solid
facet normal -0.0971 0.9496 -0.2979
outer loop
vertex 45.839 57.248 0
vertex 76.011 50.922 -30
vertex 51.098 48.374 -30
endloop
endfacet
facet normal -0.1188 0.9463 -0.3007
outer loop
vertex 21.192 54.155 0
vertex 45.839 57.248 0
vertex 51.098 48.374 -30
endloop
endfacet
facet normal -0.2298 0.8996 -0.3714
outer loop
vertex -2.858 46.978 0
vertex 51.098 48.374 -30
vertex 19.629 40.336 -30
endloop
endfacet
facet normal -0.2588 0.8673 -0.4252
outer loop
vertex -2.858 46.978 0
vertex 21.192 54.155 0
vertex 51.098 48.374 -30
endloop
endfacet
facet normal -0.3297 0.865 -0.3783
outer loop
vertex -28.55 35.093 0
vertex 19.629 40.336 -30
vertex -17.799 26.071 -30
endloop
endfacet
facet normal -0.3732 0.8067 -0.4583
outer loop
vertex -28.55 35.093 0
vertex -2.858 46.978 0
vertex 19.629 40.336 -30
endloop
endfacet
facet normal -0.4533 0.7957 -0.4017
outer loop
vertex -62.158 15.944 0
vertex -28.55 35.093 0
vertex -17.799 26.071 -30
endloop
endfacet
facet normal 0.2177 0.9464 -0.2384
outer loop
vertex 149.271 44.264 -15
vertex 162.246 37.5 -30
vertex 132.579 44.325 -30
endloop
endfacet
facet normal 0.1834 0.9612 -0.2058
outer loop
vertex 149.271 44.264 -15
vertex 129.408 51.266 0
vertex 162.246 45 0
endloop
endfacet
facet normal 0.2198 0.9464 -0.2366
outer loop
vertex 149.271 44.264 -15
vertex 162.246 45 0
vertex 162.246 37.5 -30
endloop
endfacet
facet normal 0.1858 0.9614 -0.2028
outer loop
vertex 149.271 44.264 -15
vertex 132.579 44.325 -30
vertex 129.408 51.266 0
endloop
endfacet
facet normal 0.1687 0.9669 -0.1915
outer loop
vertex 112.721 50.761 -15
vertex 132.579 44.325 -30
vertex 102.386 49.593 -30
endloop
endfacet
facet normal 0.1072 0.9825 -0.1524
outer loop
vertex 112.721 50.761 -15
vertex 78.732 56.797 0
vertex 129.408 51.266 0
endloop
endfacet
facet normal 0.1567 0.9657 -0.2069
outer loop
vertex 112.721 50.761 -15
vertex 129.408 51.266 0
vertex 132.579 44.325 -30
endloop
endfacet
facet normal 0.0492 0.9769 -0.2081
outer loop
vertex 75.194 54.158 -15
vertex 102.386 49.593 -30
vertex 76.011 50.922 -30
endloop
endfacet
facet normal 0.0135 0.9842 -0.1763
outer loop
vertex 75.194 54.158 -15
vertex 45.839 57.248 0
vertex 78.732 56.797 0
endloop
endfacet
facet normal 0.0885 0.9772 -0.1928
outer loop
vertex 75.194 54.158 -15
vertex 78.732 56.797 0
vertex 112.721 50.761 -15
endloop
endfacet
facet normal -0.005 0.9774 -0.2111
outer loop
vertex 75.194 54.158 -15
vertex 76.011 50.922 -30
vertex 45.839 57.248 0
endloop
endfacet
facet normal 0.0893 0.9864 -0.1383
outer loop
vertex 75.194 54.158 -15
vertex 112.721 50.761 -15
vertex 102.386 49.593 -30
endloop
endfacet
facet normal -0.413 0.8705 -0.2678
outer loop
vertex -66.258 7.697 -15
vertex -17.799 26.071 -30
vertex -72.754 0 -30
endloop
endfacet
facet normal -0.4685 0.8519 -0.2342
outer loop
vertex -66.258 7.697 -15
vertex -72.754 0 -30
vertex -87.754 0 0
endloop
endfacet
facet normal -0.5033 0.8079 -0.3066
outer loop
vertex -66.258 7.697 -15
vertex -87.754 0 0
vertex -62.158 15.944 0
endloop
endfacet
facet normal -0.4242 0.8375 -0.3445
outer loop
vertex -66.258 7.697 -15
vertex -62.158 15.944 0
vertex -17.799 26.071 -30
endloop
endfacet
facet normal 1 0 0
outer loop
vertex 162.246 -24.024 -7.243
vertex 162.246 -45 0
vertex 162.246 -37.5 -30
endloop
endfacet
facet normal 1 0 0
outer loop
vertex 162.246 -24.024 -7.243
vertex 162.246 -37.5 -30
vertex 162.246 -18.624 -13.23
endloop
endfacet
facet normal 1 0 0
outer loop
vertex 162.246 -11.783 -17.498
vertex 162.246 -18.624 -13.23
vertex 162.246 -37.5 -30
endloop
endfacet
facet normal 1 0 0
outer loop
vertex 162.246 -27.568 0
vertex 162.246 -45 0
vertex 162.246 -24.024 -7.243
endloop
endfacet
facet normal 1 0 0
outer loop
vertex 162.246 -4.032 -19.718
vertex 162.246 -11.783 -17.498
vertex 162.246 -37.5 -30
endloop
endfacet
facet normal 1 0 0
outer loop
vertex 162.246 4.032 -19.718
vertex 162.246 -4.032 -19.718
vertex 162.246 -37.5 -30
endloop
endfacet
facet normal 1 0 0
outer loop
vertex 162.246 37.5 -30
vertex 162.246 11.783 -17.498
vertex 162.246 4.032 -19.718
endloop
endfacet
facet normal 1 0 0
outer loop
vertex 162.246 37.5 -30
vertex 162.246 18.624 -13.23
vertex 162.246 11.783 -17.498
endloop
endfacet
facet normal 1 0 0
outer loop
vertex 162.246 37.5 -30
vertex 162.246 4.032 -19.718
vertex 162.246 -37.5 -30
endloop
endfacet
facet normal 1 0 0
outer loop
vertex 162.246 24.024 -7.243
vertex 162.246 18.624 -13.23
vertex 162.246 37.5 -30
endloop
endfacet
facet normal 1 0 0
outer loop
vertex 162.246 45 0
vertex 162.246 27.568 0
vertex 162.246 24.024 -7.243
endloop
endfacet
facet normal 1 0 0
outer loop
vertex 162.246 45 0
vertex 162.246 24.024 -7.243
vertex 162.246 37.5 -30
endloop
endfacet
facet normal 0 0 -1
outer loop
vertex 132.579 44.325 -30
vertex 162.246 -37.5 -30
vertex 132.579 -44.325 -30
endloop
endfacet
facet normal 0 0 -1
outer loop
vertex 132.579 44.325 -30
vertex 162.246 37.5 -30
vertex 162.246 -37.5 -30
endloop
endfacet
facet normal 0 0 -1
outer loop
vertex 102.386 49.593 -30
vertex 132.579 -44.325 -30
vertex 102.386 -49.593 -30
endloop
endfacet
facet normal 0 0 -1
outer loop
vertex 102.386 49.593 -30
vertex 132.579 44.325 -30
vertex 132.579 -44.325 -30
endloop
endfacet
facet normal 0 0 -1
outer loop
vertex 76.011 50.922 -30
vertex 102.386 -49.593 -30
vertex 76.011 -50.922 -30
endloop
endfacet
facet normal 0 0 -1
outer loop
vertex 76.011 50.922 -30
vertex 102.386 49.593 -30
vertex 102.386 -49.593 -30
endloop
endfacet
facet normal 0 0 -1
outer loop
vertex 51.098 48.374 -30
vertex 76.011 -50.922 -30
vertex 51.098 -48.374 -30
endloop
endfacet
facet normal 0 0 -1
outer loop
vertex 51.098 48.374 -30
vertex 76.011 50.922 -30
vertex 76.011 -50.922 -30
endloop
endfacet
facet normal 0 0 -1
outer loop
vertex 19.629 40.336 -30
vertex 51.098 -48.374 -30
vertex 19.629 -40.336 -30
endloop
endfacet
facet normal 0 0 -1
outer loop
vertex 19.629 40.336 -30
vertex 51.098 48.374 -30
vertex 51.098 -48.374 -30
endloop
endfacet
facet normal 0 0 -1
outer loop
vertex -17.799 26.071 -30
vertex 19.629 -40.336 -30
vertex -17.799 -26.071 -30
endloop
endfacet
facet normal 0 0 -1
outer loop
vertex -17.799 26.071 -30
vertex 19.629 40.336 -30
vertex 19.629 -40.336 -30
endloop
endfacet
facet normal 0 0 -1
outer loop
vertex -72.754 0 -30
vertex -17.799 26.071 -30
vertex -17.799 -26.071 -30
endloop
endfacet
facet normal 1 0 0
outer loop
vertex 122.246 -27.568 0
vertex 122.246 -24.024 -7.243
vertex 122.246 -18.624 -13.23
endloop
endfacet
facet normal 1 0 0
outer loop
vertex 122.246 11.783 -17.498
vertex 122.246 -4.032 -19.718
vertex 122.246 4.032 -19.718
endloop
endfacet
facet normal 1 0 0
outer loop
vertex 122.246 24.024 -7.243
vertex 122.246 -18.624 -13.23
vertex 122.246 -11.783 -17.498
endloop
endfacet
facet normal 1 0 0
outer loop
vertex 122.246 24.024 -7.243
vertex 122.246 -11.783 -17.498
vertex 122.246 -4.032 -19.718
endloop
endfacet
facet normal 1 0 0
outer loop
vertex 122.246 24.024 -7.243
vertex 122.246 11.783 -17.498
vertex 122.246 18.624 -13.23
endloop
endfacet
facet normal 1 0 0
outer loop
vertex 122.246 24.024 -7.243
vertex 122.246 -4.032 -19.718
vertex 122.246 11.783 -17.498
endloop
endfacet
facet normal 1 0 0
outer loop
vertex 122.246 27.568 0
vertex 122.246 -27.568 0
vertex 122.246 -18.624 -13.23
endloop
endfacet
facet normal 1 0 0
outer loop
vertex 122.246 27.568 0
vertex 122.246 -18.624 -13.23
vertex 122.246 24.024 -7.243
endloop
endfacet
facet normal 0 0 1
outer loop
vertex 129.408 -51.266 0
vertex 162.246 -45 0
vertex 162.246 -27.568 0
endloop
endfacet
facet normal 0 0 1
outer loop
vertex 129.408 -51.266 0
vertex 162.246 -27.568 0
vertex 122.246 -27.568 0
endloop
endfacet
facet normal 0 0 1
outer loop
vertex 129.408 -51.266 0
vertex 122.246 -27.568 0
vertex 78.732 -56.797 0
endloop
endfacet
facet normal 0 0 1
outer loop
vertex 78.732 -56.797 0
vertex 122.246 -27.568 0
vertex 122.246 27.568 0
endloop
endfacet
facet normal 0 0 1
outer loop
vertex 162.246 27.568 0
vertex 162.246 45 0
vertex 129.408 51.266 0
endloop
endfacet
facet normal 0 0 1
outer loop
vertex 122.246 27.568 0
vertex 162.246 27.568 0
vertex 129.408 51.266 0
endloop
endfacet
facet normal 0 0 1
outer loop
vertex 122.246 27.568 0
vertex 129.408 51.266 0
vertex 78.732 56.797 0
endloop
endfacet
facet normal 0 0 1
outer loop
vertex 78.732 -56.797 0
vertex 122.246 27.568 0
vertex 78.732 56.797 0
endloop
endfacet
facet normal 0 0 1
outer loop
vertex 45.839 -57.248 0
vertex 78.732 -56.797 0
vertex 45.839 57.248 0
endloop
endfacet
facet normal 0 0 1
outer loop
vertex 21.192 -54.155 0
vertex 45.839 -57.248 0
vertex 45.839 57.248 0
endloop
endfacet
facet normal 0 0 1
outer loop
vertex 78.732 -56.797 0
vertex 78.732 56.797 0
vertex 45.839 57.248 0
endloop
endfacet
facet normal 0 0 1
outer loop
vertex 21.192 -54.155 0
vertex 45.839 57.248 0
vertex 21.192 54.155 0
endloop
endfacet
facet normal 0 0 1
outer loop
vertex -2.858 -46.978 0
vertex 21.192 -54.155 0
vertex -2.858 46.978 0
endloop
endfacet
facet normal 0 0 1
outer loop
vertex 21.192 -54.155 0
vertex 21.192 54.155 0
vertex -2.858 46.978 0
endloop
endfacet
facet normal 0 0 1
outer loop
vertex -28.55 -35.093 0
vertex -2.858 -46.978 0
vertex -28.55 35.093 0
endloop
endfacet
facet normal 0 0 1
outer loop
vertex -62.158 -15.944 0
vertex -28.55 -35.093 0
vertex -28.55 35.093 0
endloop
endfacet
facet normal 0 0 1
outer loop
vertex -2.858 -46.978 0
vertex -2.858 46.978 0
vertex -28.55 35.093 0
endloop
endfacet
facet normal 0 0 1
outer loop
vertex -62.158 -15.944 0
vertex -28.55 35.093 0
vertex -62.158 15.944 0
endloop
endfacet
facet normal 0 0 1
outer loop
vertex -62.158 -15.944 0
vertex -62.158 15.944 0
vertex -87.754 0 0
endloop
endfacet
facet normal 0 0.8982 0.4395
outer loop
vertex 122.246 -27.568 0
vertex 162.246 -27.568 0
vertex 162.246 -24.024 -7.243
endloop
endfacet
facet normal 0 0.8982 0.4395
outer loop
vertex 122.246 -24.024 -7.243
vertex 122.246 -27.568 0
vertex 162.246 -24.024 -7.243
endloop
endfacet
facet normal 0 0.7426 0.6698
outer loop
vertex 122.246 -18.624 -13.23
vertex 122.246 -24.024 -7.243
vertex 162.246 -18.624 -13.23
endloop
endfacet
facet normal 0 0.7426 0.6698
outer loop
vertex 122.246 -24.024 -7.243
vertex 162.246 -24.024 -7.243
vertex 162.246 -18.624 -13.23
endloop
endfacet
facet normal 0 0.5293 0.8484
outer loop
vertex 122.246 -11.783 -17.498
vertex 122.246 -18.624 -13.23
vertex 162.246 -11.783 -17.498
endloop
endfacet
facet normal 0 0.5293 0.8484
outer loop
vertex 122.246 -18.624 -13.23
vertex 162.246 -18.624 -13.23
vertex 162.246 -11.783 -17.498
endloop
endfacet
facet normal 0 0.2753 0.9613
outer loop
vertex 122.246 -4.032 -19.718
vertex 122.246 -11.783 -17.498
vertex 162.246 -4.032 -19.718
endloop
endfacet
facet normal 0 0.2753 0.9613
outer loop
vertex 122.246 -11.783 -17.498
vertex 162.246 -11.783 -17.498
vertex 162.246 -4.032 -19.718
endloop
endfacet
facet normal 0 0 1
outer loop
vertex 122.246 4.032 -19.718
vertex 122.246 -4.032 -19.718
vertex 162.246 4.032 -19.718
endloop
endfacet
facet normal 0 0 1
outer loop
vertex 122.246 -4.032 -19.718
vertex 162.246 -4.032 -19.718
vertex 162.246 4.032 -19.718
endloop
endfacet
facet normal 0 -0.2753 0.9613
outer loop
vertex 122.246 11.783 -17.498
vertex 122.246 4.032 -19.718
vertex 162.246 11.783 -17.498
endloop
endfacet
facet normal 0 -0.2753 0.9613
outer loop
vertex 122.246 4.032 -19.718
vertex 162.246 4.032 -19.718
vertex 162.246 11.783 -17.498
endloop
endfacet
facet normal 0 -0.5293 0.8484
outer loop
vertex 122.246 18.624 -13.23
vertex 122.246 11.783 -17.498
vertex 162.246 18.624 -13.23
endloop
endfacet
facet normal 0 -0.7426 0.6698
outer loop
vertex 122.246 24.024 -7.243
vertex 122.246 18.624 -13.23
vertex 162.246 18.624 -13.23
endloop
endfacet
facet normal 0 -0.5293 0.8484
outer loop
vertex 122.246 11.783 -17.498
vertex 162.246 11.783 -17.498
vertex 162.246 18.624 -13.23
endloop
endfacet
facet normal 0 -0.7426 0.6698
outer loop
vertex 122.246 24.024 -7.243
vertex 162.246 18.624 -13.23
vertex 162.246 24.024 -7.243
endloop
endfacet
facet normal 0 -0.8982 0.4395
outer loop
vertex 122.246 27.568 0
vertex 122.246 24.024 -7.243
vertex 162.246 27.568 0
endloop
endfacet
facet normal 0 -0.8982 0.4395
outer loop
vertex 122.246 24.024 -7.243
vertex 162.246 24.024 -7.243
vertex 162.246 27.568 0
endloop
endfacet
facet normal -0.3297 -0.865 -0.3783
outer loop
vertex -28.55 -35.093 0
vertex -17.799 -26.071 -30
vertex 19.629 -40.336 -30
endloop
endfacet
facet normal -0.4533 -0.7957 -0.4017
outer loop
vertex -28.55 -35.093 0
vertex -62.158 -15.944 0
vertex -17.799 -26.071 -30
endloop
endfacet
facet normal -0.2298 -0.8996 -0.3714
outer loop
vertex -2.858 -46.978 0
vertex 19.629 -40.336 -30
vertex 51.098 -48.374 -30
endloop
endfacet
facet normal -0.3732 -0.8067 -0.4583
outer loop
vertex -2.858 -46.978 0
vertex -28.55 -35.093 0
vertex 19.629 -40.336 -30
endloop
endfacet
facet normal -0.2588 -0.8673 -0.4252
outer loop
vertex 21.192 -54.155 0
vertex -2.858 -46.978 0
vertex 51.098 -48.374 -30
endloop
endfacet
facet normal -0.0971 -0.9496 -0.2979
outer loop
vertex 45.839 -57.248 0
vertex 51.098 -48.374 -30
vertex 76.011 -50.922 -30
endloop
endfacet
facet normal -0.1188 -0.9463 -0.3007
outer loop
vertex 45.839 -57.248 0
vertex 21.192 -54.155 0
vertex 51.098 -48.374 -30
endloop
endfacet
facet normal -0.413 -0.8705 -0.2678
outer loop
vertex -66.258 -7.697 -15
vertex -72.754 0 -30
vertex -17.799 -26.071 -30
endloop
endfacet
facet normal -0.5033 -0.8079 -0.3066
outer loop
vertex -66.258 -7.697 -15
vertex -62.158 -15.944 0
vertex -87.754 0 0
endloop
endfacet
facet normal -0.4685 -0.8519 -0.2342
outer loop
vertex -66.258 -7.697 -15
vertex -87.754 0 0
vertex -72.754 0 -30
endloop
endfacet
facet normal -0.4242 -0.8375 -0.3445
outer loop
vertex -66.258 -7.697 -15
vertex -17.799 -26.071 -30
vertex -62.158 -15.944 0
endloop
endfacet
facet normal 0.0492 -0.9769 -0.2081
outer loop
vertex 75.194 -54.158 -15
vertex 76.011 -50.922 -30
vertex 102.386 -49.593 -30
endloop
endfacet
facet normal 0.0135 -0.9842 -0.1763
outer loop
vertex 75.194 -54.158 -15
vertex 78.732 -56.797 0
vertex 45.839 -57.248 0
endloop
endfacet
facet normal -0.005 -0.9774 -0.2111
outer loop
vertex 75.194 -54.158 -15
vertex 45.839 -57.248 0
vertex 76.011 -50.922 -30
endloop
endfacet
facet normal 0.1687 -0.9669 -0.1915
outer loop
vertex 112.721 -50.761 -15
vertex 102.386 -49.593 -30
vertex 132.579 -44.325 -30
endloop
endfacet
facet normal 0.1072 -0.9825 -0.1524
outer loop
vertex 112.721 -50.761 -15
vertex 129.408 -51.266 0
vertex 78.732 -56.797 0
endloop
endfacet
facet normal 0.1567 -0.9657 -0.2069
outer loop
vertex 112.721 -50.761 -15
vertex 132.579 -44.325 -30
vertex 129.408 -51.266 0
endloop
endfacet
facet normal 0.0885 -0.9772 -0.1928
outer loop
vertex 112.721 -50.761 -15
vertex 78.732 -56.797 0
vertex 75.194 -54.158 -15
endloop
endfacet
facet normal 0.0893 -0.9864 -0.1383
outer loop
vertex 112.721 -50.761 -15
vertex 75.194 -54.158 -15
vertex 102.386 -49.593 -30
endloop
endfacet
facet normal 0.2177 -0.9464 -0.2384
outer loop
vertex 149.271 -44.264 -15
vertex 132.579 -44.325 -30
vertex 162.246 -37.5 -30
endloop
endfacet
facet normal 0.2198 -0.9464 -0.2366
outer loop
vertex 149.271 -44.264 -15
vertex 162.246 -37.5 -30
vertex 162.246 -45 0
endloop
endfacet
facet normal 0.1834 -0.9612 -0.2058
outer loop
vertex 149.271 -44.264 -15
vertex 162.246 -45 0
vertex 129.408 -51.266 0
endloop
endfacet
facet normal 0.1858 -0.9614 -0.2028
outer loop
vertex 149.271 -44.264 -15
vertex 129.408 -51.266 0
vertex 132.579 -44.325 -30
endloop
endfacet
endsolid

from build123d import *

# Parameters (mm, degrees)
F5_DEPTH = 40


with BuildPart() as f3:
    # F2 (on offset) → F3 section 0
    with BuildSketch(Plane.XY.offset(-30)):
        with BuildLine():
            Line((162.2463304921, -37.5), (162.2463304921, 0))
            Line((162.2463304921, 0), (162.2463304921, 37.5))
            add(Edge.make_bspline(
                [(-72.7536695079, 0), (-29.5158392356, 21.6682380863), (60.1620321507, 64.9393967263), (129.9707958681, 44.834202262), (162.2463304921, 37.5)],
                knots=[0, 0, 0, 0, 0.5444604727, 1, 1, 1, 1], degree=3))
            add(Edge.make_bspline(
                [(-72.7536695079, 0), (-29.5158392356, -21.6682380863), (60.1620321507, -64.9393967263), (129.9707958681, -44.834202262), (162.2463304921, -37.5)],
                knots=[0, 0, 0, 0, 0.5444604727, 1, 1, 1, 1], degree=3))
        make_face()
    # F0 (on Top) → F3 section 1
    with BuildSketch(Plane.XY):
        with BuildLine():
            Line((162.2463304921, -45), (162.2463304921, 0))
            Line((162.2463304921, 0), (162.2463304921, 45))
            add(Edge.make_bspline(
                [(162.2463304921, 45), (150.1698760976, 48.6930710105), (52.7402528222, 64.2426959064), (-14.1104264901, 47.0441984602), (-73.803611279, 8.7933518628), (-87.7536695079, 0)],
                knots=[0, 0, 0, 0, 0.3575982232, 0.6819644283, 1, 1, 1, 1], degree=3))
            add(Edge.make_bspline(
                [(162.2463304921, -45), (150.1698760976, -48.6930710105), (52.7402528222, -64.2426959064), (-14.1104264901, -47.0441984602), (-73.803611279, -8.7933518628), (-87.7536695079, 0)],
                knots=[0, 0, 0, 0, 0.3575982232, 0.6819644283, 1, 1, 1, 1], degree=3))
        make_face()
    loft()

    # F4 (on face) → F5 (cut)
    with BuildSketch(Plane.YZ.offset(162.2463304921)):
        with BuildLine():
            Line((27.5680975042, 0), (-27.5680975042, 0))
            ThreePointArc((-27.5680975042, 0), (0, -20), (27.5680975042, 0))
        make_face()
    extrude(amount=-F5_DEPTH, mode=Mode.SUBTRACT)


solid = f3.part
